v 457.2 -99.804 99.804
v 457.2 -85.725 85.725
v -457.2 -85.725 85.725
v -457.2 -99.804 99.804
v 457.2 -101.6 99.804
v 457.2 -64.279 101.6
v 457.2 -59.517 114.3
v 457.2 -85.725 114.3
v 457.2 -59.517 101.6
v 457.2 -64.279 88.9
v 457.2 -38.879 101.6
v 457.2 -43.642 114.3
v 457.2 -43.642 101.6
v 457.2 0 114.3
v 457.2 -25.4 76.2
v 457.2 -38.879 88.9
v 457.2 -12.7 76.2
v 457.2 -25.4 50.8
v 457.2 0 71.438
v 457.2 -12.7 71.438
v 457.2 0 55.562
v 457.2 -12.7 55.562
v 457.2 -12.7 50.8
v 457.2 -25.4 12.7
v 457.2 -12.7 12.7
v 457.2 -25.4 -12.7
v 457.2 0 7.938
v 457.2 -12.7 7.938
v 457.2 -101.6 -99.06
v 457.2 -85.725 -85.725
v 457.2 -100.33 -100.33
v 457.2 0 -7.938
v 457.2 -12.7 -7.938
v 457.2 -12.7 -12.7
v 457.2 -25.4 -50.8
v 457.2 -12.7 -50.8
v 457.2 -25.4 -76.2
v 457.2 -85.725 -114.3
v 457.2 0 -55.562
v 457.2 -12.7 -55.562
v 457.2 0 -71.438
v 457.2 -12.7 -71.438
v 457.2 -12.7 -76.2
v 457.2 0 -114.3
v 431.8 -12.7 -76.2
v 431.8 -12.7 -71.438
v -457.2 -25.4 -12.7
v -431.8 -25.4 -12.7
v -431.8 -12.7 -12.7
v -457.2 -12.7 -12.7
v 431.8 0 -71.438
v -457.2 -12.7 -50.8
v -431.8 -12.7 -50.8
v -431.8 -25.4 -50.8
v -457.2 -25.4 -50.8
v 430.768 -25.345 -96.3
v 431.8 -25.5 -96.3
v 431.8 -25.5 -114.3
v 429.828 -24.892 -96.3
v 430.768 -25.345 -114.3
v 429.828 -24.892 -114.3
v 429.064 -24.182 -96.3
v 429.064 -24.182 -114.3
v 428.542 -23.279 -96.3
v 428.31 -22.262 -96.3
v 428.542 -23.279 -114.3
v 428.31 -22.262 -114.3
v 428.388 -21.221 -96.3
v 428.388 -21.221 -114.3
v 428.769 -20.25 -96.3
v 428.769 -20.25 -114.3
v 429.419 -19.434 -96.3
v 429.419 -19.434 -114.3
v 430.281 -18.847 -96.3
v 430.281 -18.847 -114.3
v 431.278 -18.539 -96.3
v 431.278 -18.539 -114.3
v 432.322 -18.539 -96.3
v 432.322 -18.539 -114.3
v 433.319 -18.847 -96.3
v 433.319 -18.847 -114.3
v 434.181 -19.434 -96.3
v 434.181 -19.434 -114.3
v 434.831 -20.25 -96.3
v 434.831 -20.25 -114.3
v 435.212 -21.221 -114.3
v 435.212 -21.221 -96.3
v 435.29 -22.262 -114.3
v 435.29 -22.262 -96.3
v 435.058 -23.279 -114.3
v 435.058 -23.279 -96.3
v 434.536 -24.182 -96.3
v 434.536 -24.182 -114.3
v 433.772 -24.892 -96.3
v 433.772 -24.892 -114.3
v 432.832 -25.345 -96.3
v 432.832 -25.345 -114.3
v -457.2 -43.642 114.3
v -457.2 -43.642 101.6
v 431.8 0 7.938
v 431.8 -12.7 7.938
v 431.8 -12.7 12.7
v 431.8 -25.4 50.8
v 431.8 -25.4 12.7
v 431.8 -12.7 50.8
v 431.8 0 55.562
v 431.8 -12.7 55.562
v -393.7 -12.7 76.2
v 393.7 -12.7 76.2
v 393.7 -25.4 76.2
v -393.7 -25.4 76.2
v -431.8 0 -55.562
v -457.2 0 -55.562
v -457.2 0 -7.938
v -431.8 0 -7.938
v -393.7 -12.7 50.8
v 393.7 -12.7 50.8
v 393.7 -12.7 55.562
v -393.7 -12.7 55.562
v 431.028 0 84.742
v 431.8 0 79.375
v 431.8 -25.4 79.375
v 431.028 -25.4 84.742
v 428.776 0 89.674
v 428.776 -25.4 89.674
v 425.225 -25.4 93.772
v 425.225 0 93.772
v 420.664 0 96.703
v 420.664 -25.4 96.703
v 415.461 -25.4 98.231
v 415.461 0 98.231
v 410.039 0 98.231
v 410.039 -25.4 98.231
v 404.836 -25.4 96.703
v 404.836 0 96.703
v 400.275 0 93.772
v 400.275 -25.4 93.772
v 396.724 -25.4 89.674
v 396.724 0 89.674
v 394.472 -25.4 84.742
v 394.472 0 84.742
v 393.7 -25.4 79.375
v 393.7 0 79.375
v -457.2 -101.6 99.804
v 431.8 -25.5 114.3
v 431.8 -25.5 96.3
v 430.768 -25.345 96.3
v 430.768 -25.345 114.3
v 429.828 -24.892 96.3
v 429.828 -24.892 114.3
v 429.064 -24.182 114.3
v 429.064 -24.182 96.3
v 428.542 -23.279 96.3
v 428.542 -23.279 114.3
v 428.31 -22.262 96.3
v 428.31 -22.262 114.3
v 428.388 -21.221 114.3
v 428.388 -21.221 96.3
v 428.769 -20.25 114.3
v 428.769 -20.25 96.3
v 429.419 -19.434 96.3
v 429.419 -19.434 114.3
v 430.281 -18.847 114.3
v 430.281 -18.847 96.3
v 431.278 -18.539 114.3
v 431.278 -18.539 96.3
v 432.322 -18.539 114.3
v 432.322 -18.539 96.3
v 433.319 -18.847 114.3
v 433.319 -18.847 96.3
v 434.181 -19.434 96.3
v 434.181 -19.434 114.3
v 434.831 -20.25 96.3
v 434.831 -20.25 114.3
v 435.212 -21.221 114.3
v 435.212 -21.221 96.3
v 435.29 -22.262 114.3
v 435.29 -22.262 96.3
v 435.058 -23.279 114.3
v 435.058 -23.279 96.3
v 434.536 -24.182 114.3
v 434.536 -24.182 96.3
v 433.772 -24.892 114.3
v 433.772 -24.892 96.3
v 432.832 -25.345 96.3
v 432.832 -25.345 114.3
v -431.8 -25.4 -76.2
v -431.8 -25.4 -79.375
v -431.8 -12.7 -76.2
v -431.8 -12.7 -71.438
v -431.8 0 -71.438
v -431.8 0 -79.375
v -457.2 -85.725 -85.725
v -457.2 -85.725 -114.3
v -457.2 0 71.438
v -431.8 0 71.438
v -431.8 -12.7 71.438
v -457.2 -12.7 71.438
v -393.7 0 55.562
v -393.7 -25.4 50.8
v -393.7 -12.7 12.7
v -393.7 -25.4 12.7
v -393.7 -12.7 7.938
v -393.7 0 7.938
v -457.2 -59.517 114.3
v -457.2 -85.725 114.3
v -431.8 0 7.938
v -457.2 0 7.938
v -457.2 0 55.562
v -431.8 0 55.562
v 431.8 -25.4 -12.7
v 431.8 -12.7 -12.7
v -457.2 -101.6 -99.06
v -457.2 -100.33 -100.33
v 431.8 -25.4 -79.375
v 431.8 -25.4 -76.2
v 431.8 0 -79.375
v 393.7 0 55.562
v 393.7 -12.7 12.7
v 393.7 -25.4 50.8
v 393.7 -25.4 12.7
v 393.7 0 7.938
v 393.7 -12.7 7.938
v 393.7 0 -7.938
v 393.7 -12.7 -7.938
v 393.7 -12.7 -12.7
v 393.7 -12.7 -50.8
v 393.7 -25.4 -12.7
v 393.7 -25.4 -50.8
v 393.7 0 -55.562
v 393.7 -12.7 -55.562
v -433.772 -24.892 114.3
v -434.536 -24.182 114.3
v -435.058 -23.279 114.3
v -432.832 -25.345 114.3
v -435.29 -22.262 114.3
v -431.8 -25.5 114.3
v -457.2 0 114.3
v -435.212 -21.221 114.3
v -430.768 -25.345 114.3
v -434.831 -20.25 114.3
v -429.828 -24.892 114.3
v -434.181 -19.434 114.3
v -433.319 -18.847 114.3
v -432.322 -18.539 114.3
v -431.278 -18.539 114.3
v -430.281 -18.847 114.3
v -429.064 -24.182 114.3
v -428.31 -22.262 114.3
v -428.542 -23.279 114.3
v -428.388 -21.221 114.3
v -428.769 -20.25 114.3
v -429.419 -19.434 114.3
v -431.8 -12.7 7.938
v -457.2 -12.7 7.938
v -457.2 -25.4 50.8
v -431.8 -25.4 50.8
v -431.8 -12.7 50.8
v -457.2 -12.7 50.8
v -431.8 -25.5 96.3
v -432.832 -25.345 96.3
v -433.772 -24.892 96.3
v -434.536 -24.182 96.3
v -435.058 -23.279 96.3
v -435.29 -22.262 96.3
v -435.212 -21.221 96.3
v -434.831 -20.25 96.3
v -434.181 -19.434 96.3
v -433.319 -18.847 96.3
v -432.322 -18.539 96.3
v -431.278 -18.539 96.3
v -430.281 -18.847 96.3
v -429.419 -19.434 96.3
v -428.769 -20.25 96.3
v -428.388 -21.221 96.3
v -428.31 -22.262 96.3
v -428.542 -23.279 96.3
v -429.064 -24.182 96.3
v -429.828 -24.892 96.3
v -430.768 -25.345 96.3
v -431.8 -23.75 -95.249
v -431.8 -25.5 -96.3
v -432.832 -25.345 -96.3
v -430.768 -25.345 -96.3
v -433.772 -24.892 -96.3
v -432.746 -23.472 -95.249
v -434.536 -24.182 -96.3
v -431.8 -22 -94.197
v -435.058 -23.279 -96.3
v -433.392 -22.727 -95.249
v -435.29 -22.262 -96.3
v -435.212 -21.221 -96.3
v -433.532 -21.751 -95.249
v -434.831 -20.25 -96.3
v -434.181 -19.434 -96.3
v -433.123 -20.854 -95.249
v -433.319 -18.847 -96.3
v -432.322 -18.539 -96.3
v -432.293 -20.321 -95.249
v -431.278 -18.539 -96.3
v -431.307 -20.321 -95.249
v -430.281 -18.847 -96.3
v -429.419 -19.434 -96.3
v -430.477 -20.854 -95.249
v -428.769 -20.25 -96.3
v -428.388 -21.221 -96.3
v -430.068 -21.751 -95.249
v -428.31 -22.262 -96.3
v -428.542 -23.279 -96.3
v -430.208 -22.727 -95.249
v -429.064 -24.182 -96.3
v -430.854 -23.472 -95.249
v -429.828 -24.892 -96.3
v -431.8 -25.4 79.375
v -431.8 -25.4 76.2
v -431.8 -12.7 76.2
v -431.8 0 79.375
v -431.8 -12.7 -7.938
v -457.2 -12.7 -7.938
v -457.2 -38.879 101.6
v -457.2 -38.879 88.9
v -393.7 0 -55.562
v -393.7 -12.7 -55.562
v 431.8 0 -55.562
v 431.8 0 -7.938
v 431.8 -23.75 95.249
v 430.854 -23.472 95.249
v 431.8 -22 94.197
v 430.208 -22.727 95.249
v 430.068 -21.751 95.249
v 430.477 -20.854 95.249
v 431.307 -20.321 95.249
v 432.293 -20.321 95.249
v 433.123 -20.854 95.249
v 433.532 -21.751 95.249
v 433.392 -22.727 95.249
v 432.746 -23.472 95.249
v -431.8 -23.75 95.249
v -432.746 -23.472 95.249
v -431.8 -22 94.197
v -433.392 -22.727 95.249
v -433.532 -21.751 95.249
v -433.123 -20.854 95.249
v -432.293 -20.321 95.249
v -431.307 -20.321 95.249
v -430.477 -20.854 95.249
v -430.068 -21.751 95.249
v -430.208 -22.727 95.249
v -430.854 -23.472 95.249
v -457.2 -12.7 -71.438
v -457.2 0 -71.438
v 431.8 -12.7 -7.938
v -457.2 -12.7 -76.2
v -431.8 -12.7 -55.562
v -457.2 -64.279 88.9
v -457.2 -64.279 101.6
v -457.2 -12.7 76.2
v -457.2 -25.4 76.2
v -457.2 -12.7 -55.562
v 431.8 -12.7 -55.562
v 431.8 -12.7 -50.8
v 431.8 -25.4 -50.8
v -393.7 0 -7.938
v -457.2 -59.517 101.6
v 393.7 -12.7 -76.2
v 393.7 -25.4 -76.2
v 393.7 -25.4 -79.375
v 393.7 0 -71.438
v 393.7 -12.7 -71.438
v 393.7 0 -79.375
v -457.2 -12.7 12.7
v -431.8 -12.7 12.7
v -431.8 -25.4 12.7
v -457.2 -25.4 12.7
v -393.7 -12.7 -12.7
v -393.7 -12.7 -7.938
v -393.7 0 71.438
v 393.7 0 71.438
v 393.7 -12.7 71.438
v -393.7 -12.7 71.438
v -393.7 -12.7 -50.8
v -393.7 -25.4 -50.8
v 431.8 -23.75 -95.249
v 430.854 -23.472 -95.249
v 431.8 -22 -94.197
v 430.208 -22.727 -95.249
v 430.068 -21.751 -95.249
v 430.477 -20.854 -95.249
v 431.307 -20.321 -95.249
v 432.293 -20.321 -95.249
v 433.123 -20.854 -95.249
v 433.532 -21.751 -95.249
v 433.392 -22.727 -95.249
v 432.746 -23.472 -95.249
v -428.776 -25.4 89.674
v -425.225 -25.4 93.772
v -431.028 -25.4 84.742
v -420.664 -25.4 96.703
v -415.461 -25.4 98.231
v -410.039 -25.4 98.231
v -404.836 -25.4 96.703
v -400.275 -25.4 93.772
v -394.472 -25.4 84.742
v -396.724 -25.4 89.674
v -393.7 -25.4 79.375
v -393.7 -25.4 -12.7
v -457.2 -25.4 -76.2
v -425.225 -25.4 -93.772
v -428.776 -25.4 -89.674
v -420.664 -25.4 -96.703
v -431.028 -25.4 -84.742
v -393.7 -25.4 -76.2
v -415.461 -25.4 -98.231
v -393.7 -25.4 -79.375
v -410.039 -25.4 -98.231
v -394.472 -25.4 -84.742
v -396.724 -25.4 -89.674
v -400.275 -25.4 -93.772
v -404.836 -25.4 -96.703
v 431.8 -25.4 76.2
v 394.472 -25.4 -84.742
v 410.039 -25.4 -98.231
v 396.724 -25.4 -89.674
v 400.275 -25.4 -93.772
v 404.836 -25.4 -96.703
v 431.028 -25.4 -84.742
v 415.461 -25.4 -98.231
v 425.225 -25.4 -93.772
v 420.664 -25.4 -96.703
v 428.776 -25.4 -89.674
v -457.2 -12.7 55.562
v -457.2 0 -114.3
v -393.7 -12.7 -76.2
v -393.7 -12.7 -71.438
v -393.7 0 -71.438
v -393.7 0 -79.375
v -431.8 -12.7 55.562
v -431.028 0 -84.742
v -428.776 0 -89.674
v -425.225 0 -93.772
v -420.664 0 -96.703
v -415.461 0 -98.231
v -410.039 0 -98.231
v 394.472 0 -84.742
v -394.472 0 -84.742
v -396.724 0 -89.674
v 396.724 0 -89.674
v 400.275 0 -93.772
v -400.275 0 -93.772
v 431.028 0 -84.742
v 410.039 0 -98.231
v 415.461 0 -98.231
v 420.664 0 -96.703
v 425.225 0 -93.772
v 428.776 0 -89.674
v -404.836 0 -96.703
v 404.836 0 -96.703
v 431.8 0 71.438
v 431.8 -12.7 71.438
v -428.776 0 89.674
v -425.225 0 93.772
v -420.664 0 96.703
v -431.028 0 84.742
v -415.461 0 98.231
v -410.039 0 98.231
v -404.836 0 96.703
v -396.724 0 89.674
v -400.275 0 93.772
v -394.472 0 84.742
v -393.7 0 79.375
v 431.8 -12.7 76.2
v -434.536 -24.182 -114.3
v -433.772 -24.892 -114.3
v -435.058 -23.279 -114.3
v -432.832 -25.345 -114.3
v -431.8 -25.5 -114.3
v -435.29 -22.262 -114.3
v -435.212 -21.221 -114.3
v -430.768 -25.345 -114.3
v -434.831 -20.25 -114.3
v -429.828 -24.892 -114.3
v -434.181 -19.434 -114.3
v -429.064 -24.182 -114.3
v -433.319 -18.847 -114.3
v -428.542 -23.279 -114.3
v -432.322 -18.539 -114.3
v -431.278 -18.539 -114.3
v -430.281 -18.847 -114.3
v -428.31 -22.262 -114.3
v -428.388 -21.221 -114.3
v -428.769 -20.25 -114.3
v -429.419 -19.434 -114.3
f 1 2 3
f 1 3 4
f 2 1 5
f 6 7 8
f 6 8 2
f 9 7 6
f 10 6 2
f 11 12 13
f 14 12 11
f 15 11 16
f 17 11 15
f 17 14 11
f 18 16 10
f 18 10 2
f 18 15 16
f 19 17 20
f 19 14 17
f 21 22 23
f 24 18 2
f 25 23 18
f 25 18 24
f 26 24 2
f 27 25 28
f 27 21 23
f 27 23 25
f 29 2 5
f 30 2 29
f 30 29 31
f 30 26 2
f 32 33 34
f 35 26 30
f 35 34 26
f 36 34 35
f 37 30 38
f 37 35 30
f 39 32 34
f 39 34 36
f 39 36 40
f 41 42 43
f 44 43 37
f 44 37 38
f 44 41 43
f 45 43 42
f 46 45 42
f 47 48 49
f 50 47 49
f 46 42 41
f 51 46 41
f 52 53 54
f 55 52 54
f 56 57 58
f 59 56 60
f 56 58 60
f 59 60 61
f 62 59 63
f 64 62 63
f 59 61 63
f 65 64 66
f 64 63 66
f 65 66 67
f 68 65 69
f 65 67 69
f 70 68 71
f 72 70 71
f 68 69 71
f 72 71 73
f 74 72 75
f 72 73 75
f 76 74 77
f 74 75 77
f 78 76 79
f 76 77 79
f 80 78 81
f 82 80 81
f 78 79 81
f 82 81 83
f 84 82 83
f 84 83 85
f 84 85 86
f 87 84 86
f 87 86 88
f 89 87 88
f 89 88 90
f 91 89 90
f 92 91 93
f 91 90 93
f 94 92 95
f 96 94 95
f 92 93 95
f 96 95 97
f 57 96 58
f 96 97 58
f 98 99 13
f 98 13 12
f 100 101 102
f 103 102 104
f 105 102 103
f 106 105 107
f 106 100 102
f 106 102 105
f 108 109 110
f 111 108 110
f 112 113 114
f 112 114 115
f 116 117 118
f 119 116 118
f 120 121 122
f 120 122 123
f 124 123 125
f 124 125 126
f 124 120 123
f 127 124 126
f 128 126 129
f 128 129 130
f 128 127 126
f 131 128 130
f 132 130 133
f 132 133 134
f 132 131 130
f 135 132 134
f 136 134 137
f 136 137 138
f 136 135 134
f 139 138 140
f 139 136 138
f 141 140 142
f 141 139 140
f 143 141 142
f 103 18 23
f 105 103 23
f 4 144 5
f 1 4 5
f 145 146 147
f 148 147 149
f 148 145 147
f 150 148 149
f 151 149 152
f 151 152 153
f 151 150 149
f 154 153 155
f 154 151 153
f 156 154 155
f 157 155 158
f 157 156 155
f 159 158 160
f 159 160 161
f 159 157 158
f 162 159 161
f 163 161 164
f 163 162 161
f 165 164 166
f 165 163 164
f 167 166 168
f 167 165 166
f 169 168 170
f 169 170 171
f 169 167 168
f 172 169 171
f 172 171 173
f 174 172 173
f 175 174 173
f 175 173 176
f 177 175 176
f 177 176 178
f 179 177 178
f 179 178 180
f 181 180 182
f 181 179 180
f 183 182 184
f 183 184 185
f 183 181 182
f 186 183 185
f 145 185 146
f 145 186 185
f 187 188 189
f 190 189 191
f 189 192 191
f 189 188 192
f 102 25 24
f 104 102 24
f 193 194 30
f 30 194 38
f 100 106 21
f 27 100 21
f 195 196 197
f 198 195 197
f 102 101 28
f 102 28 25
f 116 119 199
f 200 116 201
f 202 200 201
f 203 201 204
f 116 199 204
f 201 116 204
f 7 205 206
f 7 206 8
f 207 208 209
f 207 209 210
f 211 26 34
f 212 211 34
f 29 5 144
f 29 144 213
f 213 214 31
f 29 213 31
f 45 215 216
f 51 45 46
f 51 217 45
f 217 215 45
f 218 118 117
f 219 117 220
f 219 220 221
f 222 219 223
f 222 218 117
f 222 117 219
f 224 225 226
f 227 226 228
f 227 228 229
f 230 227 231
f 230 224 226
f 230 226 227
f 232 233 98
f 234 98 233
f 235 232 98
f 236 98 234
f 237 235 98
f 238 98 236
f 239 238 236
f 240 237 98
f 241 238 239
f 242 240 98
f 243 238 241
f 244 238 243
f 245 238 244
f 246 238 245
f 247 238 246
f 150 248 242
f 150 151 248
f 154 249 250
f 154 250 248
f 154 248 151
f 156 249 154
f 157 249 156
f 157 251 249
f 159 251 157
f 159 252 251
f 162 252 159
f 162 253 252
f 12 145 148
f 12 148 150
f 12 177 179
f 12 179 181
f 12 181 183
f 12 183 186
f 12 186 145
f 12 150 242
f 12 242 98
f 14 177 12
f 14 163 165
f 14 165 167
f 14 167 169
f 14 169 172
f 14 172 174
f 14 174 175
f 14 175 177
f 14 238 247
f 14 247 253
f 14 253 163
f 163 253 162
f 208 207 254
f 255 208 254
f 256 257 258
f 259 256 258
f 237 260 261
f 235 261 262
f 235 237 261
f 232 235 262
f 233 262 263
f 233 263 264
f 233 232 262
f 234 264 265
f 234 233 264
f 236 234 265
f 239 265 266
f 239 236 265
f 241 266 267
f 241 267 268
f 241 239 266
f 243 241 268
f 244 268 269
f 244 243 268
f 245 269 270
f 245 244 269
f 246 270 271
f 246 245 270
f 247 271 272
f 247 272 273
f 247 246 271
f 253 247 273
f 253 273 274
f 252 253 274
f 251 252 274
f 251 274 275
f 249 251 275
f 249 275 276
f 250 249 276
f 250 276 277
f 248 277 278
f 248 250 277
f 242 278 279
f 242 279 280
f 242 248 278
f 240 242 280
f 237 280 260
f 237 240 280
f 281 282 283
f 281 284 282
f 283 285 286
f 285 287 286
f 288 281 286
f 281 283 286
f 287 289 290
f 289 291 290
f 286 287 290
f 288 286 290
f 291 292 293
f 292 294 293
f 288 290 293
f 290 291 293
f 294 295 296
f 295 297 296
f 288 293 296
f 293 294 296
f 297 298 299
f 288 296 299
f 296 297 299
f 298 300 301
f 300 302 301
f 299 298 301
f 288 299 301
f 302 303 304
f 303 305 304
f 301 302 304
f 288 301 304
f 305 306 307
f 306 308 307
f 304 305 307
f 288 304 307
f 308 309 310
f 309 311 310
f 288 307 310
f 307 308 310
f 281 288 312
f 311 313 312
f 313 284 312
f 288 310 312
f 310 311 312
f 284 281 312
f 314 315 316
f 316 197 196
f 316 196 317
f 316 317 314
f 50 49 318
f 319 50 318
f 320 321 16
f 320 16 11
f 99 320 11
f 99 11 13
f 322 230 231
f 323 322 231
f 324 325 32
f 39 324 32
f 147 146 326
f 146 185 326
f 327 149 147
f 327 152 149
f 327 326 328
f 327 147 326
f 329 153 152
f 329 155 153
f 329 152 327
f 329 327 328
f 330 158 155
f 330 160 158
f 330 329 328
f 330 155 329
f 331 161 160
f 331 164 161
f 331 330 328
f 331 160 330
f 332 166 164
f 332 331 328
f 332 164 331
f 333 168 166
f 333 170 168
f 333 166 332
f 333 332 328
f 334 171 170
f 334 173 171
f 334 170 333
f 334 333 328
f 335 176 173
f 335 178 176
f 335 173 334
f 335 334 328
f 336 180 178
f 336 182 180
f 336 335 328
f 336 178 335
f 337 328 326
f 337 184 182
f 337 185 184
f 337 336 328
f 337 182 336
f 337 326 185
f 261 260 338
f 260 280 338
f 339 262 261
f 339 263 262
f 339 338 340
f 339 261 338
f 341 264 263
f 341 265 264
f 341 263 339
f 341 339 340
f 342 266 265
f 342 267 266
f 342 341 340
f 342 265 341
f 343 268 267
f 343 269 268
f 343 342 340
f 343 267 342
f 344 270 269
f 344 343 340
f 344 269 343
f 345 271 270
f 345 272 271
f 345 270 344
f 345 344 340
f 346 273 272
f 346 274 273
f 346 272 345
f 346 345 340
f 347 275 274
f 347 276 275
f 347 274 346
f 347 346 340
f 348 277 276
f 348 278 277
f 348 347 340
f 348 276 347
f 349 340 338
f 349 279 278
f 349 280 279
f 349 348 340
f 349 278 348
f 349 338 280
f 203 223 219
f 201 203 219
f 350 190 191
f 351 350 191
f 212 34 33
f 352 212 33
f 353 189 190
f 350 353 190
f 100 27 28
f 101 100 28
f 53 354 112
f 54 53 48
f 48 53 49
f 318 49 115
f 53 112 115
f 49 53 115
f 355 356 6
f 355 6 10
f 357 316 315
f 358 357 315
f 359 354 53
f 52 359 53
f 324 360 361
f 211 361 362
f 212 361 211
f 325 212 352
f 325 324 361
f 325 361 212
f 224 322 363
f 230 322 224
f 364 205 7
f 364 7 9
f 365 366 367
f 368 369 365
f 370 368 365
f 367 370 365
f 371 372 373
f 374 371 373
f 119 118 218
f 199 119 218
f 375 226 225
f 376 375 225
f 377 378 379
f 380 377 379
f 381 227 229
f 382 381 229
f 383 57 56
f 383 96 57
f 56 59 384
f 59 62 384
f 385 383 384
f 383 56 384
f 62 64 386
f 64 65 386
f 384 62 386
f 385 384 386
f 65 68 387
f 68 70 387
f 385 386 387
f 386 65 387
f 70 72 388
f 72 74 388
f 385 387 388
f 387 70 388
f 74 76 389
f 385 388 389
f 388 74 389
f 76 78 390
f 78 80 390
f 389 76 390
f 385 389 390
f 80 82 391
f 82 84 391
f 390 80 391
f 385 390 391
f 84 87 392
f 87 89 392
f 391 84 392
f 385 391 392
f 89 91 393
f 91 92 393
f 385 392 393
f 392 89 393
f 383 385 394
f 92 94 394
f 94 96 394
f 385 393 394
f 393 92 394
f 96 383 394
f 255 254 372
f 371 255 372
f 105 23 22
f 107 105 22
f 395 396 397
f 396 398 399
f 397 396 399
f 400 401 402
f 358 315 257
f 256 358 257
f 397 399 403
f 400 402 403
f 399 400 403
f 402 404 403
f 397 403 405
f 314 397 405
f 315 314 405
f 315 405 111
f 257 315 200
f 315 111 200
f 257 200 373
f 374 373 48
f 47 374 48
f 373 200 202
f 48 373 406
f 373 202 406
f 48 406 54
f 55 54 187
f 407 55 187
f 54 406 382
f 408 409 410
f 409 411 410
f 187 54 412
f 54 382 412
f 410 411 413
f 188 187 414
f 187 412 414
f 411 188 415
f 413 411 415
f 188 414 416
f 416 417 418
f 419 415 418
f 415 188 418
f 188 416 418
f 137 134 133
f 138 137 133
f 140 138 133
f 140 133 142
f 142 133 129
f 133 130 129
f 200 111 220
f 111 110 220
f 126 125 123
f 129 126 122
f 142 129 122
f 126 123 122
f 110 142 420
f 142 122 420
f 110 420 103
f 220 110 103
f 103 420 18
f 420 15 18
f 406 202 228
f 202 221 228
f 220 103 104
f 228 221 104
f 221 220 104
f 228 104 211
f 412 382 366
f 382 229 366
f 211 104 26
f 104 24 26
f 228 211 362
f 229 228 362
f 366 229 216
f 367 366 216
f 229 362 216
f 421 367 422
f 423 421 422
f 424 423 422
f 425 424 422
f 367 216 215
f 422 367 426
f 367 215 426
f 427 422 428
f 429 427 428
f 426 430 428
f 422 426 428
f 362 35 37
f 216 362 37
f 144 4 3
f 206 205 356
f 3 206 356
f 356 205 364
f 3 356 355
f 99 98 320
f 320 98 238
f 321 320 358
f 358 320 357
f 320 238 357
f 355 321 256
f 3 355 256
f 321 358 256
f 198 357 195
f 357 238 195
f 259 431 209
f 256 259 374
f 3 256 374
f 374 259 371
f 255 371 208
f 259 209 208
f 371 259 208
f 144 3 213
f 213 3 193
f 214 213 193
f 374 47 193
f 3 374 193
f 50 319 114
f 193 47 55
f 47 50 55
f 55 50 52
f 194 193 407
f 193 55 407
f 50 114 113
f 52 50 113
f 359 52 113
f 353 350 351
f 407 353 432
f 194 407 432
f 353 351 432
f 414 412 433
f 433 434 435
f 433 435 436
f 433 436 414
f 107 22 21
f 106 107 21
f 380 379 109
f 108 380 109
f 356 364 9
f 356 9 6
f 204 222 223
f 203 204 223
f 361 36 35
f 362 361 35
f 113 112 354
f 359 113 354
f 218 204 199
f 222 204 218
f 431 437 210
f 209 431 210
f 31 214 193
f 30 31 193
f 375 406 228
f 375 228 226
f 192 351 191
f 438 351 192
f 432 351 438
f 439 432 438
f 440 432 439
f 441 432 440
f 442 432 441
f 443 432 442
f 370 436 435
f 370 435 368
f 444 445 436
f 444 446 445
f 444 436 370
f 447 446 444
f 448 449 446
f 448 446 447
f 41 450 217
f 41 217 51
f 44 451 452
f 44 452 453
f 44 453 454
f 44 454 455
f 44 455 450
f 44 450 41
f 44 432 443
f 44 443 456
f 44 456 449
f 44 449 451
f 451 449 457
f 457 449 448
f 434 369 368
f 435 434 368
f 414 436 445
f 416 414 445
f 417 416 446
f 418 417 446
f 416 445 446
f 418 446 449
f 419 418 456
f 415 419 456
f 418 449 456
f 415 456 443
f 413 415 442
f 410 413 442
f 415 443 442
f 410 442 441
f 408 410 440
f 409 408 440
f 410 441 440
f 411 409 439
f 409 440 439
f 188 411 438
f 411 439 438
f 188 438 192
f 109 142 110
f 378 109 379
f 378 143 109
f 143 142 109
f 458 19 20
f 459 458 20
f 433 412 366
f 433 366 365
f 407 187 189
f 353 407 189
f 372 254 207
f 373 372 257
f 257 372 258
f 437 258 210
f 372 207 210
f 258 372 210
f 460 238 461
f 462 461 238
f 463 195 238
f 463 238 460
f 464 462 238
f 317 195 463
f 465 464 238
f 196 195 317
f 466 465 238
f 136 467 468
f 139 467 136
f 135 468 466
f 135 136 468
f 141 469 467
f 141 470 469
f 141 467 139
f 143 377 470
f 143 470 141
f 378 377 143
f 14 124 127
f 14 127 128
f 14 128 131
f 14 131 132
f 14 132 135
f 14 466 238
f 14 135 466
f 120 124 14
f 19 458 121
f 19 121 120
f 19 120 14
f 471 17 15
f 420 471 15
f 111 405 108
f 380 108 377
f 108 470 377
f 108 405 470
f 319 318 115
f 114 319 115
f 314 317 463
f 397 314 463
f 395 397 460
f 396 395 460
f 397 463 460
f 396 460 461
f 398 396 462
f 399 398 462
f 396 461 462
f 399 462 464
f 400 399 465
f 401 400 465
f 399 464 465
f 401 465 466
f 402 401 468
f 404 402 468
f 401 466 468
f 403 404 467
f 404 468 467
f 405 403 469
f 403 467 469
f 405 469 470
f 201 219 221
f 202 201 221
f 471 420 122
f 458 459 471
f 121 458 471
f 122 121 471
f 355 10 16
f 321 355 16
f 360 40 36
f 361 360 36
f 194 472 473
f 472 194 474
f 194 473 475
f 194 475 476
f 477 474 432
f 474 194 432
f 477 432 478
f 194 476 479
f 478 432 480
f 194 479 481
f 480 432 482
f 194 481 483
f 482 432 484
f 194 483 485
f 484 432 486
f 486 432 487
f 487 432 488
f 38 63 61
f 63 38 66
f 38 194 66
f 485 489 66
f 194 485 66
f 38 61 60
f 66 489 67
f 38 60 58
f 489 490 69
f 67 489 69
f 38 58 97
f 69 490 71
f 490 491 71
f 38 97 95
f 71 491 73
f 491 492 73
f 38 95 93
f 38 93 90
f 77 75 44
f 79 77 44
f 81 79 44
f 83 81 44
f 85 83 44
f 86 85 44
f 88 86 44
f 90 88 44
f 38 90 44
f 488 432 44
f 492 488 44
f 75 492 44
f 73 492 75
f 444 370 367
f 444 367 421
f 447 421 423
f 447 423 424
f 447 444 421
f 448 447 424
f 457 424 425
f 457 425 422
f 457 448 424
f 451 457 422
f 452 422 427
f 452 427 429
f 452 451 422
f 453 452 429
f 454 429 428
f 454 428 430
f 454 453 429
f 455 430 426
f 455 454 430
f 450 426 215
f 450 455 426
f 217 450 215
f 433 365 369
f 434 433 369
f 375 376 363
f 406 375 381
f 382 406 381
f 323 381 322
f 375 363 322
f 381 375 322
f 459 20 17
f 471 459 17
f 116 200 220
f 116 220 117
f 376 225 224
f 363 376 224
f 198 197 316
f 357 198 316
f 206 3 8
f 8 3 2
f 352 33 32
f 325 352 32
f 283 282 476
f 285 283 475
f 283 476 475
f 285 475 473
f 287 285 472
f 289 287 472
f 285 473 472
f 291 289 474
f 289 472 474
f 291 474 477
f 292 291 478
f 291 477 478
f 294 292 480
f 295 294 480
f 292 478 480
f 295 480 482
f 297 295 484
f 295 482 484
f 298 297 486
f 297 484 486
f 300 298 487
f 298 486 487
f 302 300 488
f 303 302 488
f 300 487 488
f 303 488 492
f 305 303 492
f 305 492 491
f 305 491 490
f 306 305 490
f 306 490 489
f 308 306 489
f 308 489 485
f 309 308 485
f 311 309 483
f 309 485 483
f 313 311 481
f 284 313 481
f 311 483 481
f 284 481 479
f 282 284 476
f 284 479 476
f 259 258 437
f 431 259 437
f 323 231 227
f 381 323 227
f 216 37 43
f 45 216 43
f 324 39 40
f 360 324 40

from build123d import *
from OCP.BRepFilletAPI import BRepFilletAPI_MakeChamfer

# Parameters (mm, degrees)
SKETCH1_W                      = 914.4
SKETCH1_H                      = 228.6
EXTRUDE1_DEPTH                 = 85.725
CUT_EXTRUDE1_DEPTH             = 480.004285602
LPATTERN1_COUNT                = 2
LPATTERN1_PITCH                = 63.5
LPATTERN1_COL_COUNT            = 2
LPATTERN1_COL_PITCH            = 63.5
CUT_EXTRUDE2_DEPTH             = 480.004285602
CUT_EXTRUDE2_DEPTH_BACK        = 480.004285602
EXTRUDE2_DEPTH                 = 457.2
EXTRUDE2_DEPTH_BACK            = 457.2
CHAMFER1_SIZE                  = 2.54
CHAMFER1_SIZE2                 = 1.796051224
CUT_EXTRUDE3_REACH             = 484.098
M8X1_0_TAPPED_HOLE1_AT_2_COUNT = 2
M8X1_0_TAPPED_HOLE1_AT_2_PITCH = 863.6


with BuildPart() as part:
    # Sketch1 → Extrude1 (new body)
    with BuildSketch(Plane(origin=(0, 0, 0), x_dir=(1, 0, 0), z_dir=(0, 1, 0))):
        Rectangle(SKETCH1_W, SKETCH1_H)
    extrude(amount=-EXTRUDE1_DEPTH)

    # Sketch2 → Cut-Extrude1 (cut, symmetric)
    with BuildSketch(Plane(origin=(0, 0, 0), x_dir=(0, 0, -1), z_dir=(1, 0, 0))):
        Polygon((12.7, -25.4), (12.7, -12.7), (7.9375, -12.7), (7.9375, 0), (-7.9375, 0), (-7.9375, -12.7), (-12.7, -12.7), (-12.7, -25.4), align=None)
    cut_extrude1 = extrude(amount=CUT_EXTRUDE1_DEPTH, both=True, mode=Mode.SUBTRACT)

    # LPattern1: Cut-Extrude1 ×2
    with Locations(*[(0, 0, -i * LPATTERN1_PITCH) for i in range(1, LPATTERN1_COUNT)]):
        add(cut_extrude1, mode=Mode.SUBTRACT)

    # LPattern1 col: Cut-Extrude1 ×2
    with Locations(*[(0, 0, i * LPATTERN1_COL_PITCH) for i in range(1, LPATTERN1_COL_COUNT)]):
        add(cut_extrude1, mode=Mode.SUBTRACT)

    # Sketch3 → Cut-Extrude2 (cut, two sides: drawn at the far end of the back side and taken through both)
    with BuildSketch(Plane(origin=(0, 0, 0), x_dir=(0, 0, -1), z_dir=(1, 0, 0)).offset(-CUT_EXTRUDE2_DEPTH_BACK)):
        Polygon((-114.3, -59.51659036), (-101.6, -59.51659036), (-101.6, -64.27909036), (-88.9, -64.27909036), (-88.9, -38.87909036), (-101.6, -38.87909036), (-101.6, -43.64159036), (-114.3, -43.64159036), align=None)
    extrude(amount=CUT_EXTRUDE2_DEPTH + CUT_EXTRUDE2_DEPTH_BACK, mode=Mode.SUBTRACT)

    # Sketch4 → Extrude2 (add, two sides: drawn at the far end of the back side and taken through both)
    with BuildSketch(Plane(origin=(0, 0, 0), x_dir=(0, 0, -1), z_dir=(1, 0, 0)).offset(-EXTRUDE2_DEPTH_BACK)):
        Polygon((-85.725, -85.725), (-101.6, -101.6), (101.6, -101.6), (85.725, -85.725), align=None)
    extrude(amount=EXTRUDE2_DEPTH + EXTRUDE2_DEPTH_BACK)

    # Chamfer1: one chamfer whose edges measure the first distance from different faces: ONE call of the kernel's chamfer builder (chamfer() names one face for all edges)
    chamfer1_edges_1 = [part.edges().sort_by_distance(p)[0] for p in [
        (0, -101.6, -101.6),
    ]]
    chamfer1_side_1 = [part.faces().sort_by_distance(p)[0] for p in [
        (0, -101.6, 0),
    ]]
    chamfer1_edges_2 = [part.edges().sort_by_distance(p)[0] for p in [
        (0, -101.6, 101.6),
    ]]
    chamfer1_side_2 = [part.faces().sort_by_distance(p)[0] for p in [
        (0, -93.6625, 93.6625),
    ]]
    chamfer1 = BRepFilletAPI_MakeChamfer(part.part.solid().wrapped)
    for e in chamfer1_edges_1:
        chamfer1.Add(CHAMFER1_SIZE, CHAMFER1_SIZE2, e.wrapped, chamfer1_side_1[0].wrapped)  # the first distance lies on this face
    for e in chamfer1_edges_2:
        chamfer1.Add(CHAMFER1_SIZE, CHAMFER1_SIZE2, e.wrapped, chamfer1_side_2[0].wrapped)  # the first distance lies on this face
    add(Compound.cast(chamfer1.Shape()), mode=Mode.REPLACE)

    # Cut-Extrude3: up to this face of the body (flat: up to its plane)
    cut_extrude3_end = Plane(part.part.faces().sort_by_distance((0, -25.4, 63.5))[0])
    # Sketch5 → Cut-Extrude3 (cut, up to the picked face)
    with BuildSketch(Plane(origin=(0, 0, 0), x_dir=(-1, 0, 0), z_dir=(0, 1, 0)), mode=Mode.PRIVATE) as cut_extrude3_sk1:
        with BuildLine():
            Line((431.8, -79.375), (431.8, 79.375))
            ThreePointArc((431.8, 79.375), (412.75, 98.425), (393.7, 79.375))
            Line((393.7, 79.375), (393.7, -79.375))
            ThreePointArc((393.7, -79.375), (412.75, -98.425), (431.8, -79.375))
        make_face()
    cut_extrude3_tool1 = split(extrude(cut_extrude3_sk1.sketch, amount=-CUT_EXTRUDE3_REACH, mode=Mode.PRIVATE), bisect_by=cut_extrude3_end, keep=Keep.BOTH, mode=Mode.PRIVATE)
    cut_extrude3 = cut_extrude3_tool1.solids().sort_by(Axis((-412.75, 0, 0), (0, -1, 0)))[0]
    add(cut_extrude3, mode=Mode.SUBTRACT)

    # Mirror1: Cut-Extrude3 across plane
    add(cut_extrude3.mirror(Plane(origin=(0, 0, 0), x_dir=(0, 0, 1), z_dir=(1, 0, 0))), mode=Mode.SUBTRACT)

    # Sketch6 → M8x1.0 Tapped Hole1 (revolve, cut)
    with BuildSketch(Plane(origin=(431.8, -22, 114.3), x_dir=(0, -1, 0), z_dir=(1, 0, 0))):
        Polygon((0, 0), (0, 20.103001567), (3.5, 17.9999894), (3.5, 0), align=None)
    m8x1_0_tapped_hole1 = revolve(axis=Axis((431.8, -22, 120.65), (0, 0, -1)), mode=Mode.SUBTRACT)

    # M8x1.0 Tapped Hole1 at 2: M8x1.0 Tapped Hole1 ×2
    with Locations(*[(-i * M8X1_0_TAPPED_HOLE1_AT_2_PITCH, 0, 0) for i in range(1, M8X1_0_TAPPED_HOLE1_AT_2_COUNT)]):
        add(m8x1_0_tapped_hole1, mode=Mode.SUBTRACT)

    # Mirror2: M8x1.0 Tapped Hole1 across plane
    add(m8x1_0_tapped_hole1.mirror(Plane.XY), mode=Mode.SUBTRACT)

    # Mirror2 copy 1 sketch → Mirror2 copy 1 (revolve, cut)
    with BuildSketch(Plane(origin=(-431.8, -22, -114.3), x_dir=(0, -1, 0), z_dir=(1, 0, 0))):
        Polygon((0, 0), (0, -20.103001567), (3.5, -17.9999894), (3.5, 0), align=None)
    revolve(axis=Axis((-431.8, -22, -120.65), (0, 0, -1)), mode=Mode.SUBTRACT)


solid = part.part
